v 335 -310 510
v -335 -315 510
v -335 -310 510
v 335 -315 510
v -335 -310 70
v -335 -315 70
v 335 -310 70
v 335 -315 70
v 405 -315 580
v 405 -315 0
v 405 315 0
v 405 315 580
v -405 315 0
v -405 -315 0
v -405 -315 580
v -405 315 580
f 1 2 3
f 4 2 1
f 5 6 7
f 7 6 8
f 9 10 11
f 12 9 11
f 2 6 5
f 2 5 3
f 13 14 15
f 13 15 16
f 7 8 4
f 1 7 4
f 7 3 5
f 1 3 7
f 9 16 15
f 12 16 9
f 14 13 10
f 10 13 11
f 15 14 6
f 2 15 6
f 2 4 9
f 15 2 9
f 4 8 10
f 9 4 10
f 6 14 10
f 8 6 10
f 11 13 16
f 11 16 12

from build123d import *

# Parameters (mm, degrees)
F0_W      = 810
F0_H      = 630
F1_DEPTH  = 580
F2_W      = 670
F2_H      = 440
F3_DEPTH  = 5
F5_DEPTH  = 300
F7_DEPTH  = 600
F9_DEPTH  = 300
F10_W     = 1600
F10_H     = 80
F11_DEPTH = 700


with BuildPart() as f1:
    # F0 (on Top) → F1 (new body)
    with BuildSketch(Plane.XY):
        Rectangle(F0_W, F0_H)
    extrude(amount=F1_DEPTH)

    # F2 (on face) → F3 (cut)
    with BuildSketch(Plane.XZ.offset(315)):
        with Locations((0, 290)):
            Rectangle(F2_W, F2_H)
    extrude(amount=-F3_DEPTH, mode=Mode.SUBTRACT)


with BuildPart() as f5:
    # F4 (on face) → F5 (new body)
    with BuildSketch(Plane(origin=(0, 315, 0), x_dir=(-1, 0, 0), z_dir=(0, 1, 0))):
        Polygon((-405, 1600), (-1605, 1600), (-1605, -400), (-405, -400), (-405, 0), (-405, 580), align=None)
    extrude(amount=-F5_DEPTH)


with BuildPart() as f7:
    # F6 (on face) → F7 (new body)
    with BuildSketch(Plane(origin=(0, 315, 0), x_dir=(-1, 0, 0), z_dir=(0, 1, 0))):
        Polygon((-405, 580), (405, 580), (405, 0), (705, 0), (705, 880), (-405, 880), (-805, 880), (-805, -400), (-405, -400), (-405, 0), align=None)
    extrude(amount=-F7_DEPTH)


with BuildPart() as f9_tool:
    # F8 (on face) → F9 (new body)
    with BuildSketch(Plane(origin=(0, 315, 0), x_dir=(-1, 0, 0), z_dir=(0, 1, 0))):
        Polygon((-405, 880), (-805, 880), (-805, -400), (-405, -400), (-405, 580), align=None)
    extrude(amount=-F9_DEPTH)


with BuildPart() as f5_1:
    add(f5.part)

    # F9: cut by f9_tool
    add(f9_tool.part, mode=Mode.SUBTRACT)


with BuildPart() as f7_1:
    add(f7.part)

    # F9: cut by f9_tool
    add(f9_tool.part, mode=Mode.SUBTRACT)


with BuildPart() as f11:
    # F10 (on face) → F11 (new body)
    with BuildSketch(Plane(origin=(0, 315, 0), x_dir=(-1, 0, 0), z_dir=(0, 1, 0))):
        Polygon((-405, 0), (-405, -80), (1105, -80), (1105, 0), (405, 0), align=None)
        with Locations((-1205, -40)):
            Rectangle(F10_W, F10_H)
    extrude(amount=-F11_DEPTH)


solid = f1.part
